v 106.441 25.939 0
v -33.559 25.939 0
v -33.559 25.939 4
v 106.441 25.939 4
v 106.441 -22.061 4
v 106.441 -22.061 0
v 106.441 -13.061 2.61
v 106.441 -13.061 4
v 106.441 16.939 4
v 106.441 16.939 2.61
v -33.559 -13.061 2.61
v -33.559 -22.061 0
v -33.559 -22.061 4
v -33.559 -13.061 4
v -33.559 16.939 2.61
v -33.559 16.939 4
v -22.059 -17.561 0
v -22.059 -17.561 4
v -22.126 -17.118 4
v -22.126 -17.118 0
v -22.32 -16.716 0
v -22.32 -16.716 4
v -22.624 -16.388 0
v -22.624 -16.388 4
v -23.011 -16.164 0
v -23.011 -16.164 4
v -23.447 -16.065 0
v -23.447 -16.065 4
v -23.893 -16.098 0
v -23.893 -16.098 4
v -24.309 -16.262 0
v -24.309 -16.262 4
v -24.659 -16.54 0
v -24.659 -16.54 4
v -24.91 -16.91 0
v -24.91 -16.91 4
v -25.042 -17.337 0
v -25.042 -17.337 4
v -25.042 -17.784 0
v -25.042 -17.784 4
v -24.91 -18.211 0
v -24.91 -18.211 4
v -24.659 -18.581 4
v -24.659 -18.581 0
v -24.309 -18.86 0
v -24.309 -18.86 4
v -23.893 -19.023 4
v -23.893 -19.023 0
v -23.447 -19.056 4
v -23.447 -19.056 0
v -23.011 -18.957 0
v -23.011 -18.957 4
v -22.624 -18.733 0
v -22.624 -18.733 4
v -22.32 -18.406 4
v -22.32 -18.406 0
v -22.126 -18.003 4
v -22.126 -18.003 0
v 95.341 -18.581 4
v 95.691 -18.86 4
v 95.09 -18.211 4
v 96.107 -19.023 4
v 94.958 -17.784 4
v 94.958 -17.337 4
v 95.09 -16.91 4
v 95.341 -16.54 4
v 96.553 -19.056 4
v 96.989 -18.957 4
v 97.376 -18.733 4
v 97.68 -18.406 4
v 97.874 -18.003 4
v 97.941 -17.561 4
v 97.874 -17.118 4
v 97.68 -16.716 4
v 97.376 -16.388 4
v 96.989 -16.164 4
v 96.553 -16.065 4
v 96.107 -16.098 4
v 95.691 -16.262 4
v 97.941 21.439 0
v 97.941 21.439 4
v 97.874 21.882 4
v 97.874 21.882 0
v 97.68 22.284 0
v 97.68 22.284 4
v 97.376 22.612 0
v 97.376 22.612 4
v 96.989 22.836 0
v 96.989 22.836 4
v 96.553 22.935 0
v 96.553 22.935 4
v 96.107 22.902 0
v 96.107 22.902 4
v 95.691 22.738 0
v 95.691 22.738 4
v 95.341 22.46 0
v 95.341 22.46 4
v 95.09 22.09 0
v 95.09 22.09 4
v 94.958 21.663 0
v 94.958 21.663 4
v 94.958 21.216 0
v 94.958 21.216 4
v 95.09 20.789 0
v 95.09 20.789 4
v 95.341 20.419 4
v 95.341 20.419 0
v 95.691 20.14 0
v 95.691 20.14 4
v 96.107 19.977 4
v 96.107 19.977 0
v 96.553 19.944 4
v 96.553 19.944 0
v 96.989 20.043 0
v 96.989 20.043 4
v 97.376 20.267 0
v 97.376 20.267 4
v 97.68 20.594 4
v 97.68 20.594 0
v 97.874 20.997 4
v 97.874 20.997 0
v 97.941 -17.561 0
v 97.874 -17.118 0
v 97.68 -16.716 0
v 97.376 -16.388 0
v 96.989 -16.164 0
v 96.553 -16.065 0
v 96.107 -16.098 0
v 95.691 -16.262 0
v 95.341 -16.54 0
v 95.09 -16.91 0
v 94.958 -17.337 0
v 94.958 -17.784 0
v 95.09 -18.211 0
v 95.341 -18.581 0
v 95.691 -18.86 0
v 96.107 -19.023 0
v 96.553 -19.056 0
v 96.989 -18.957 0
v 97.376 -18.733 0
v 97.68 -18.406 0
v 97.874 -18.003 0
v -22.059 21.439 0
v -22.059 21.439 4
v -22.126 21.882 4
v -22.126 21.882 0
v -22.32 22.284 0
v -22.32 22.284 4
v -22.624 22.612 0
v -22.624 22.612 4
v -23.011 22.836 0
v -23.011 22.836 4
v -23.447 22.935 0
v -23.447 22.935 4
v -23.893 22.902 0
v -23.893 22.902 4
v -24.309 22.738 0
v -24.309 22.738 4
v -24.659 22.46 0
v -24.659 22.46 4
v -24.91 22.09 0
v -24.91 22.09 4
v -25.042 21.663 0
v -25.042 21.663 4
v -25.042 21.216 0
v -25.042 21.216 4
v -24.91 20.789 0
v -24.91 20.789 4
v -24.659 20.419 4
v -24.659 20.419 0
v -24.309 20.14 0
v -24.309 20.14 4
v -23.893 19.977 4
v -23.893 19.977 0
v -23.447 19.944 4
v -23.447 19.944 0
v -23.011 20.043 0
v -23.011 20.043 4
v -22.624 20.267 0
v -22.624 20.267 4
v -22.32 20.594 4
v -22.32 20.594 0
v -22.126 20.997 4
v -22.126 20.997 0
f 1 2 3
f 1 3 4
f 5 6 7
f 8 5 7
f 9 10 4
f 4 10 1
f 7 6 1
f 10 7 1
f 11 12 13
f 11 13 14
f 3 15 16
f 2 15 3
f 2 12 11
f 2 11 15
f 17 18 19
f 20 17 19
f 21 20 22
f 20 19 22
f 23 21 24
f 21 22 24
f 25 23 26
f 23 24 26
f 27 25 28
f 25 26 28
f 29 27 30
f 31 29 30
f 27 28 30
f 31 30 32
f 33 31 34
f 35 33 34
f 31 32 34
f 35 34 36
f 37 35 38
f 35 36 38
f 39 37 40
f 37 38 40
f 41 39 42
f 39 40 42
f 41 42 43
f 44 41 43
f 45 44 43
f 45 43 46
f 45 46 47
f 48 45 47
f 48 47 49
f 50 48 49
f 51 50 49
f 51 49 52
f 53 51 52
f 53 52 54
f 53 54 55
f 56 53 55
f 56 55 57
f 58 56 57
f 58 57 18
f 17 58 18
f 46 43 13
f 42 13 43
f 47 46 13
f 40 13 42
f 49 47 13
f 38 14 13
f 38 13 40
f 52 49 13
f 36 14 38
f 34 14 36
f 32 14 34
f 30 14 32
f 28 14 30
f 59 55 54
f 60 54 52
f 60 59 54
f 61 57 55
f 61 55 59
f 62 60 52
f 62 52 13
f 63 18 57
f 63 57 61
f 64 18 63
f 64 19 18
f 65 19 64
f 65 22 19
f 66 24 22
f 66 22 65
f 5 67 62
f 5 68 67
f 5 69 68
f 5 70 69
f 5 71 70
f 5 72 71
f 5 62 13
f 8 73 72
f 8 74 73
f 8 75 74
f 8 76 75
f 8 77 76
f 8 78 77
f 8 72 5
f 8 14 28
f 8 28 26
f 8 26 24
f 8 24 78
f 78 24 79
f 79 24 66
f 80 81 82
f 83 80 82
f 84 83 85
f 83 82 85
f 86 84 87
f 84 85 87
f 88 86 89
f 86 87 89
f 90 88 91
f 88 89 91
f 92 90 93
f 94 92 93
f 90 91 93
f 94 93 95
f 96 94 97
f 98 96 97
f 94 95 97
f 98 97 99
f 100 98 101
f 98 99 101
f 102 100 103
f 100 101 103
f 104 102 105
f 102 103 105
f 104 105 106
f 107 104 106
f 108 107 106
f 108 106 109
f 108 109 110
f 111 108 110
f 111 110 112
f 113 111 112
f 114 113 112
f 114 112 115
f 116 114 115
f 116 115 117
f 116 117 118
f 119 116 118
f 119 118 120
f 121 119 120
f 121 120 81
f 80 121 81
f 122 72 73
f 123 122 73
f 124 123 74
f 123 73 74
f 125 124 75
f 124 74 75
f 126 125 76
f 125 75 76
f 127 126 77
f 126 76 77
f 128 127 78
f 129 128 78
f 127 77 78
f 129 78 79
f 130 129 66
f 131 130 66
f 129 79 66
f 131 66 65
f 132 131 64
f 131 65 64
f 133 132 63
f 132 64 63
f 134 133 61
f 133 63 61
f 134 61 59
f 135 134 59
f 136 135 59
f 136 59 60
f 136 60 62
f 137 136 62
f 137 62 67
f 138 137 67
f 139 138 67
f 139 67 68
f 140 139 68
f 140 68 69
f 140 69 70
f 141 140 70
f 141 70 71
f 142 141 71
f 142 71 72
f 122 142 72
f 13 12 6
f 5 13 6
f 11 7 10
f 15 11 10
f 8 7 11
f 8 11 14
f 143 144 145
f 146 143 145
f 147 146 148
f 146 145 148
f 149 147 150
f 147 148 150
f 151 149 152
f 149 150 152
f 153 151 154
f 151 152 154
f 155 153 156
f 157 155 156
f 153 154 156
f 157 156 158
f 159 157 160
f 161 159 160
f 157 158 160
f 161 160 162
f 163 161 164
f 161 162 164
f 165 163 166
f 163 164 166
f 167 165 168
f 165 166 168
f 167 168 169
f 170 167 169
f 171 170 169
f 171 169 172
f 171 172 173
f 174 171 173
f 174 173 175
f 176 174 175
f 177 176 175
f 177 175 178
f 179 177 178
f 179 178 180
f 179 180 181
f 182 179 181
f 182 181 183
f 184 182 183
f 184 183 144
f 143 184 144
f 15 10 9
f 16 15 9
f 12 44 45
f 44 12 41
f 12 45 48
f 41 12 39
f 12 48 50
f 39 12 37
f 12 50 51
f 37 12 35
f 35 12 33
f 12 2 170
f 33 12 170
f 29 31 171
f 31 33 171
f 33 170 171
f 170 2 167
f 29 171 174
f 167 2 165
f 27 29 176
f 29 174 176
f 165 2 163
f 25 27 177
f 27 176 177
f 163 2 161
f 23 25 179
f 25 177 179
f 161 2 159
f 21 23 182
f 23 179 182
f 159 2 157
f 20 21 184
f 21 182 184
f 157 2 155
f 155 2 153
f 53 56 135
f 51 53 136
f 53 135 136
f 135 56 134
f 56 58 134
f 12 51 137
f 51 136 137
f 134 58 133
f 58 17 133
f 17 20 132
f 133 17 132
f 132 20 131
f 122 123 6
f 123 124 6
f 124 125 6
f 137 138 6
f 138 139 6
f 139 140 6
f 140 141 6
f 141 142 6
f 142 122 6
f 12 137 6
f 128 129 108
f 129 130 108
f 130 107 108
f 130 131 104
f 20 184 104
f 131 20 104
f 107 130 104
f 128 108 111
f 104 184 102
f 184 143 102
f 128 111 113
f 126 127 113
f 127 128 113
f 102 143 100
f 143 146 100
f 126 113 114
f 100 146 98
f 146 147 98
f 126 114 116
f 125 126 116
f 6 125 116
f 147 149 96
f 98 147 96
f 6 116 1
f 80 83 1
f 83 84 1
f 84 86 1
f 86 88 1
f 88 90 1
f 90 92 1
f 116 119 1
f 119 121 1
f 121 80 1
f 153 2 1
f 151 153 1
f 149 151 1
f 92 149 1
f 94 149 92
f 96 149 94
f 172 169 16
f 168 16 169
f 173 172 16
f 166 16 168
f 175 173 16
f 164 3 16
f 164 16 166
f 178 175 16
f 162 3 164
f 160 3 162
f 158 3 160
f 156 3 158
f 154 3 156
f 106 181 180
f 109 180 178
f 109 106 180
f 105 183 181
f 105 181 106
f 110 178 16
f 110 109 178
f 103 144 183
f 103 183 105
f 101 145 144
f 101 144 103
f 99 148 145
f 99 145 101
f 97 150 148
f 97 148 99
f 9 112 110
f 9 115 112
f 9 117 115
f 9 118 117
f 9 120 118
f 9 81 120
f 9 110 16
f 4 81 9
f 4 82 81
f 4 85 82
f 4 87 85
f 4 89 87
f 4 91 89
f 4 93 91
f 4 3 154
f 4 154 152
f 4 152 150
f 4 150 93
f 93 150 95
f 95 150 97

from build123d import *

# Parameters (mm, degrees)
ESQUISSE1_W             = 140
ESQUISSE1_H             = 48
BOSS_EXTRU_1_DEPTH      = 4
ESQUISSE2_W             = 1.390122209
ESQUISSE2_H             = 30
ENL_V_MAT_EXTRU_1_DEPTH = 141
ESQUISSE4_R             = 1.5
ENL_V_MAT_EXTRU_3_DEPTH = 6


with BuildPart() as part:
    # Esquisse1 → Boss.-Extru.1 (new body)
    with BuildSketch(Plane.XY):
        with Locations((36.441041546, 1.939393939)):
            Rectangle(ESQUISSE1_W, ESQUISSE1_H)
    extrude(amount=BOSS_EXTRU_1_DEPTH)

    # Esquisse2 → Enlèv. mat.-Extru.1 (cut, through all)
    with BuildSketch(Plane.ZY.offset(33.558958454)):
        with Locations((3.304938896, 1.939393939)):
            Rectangle(ESQUISSE2_W, ESQUISSE2_H)
    extrude(amount=-ENL_V_MAT_EXTRU_1_DEPTH, mode=Mode.SUBTRACT)

    # Esquisse4 → Enlèv. mat.-Extru.3 (cut)
    with BuildSketch(Plane.XY.offset(4)):
        with Locations((-23.558958454, 21.439393939)):
            Circle(ESQUISSE4_R)
        with Locations((96.441041546, 21.439393939)):
            Circle(ESQUISSE4_R)
        with Locations((-23.558958454, -17.560606061)):
            Circle(ESQUISSE4_R)
        with Locations((96.441041546, -17.560606061)):
            Circle(ESQUISSE4_R)
    extrude(amount=-ENL_V_MAT_EXTRU_3_DEPTH, mode=Mode.SUBTRACT)


solid = part.part
